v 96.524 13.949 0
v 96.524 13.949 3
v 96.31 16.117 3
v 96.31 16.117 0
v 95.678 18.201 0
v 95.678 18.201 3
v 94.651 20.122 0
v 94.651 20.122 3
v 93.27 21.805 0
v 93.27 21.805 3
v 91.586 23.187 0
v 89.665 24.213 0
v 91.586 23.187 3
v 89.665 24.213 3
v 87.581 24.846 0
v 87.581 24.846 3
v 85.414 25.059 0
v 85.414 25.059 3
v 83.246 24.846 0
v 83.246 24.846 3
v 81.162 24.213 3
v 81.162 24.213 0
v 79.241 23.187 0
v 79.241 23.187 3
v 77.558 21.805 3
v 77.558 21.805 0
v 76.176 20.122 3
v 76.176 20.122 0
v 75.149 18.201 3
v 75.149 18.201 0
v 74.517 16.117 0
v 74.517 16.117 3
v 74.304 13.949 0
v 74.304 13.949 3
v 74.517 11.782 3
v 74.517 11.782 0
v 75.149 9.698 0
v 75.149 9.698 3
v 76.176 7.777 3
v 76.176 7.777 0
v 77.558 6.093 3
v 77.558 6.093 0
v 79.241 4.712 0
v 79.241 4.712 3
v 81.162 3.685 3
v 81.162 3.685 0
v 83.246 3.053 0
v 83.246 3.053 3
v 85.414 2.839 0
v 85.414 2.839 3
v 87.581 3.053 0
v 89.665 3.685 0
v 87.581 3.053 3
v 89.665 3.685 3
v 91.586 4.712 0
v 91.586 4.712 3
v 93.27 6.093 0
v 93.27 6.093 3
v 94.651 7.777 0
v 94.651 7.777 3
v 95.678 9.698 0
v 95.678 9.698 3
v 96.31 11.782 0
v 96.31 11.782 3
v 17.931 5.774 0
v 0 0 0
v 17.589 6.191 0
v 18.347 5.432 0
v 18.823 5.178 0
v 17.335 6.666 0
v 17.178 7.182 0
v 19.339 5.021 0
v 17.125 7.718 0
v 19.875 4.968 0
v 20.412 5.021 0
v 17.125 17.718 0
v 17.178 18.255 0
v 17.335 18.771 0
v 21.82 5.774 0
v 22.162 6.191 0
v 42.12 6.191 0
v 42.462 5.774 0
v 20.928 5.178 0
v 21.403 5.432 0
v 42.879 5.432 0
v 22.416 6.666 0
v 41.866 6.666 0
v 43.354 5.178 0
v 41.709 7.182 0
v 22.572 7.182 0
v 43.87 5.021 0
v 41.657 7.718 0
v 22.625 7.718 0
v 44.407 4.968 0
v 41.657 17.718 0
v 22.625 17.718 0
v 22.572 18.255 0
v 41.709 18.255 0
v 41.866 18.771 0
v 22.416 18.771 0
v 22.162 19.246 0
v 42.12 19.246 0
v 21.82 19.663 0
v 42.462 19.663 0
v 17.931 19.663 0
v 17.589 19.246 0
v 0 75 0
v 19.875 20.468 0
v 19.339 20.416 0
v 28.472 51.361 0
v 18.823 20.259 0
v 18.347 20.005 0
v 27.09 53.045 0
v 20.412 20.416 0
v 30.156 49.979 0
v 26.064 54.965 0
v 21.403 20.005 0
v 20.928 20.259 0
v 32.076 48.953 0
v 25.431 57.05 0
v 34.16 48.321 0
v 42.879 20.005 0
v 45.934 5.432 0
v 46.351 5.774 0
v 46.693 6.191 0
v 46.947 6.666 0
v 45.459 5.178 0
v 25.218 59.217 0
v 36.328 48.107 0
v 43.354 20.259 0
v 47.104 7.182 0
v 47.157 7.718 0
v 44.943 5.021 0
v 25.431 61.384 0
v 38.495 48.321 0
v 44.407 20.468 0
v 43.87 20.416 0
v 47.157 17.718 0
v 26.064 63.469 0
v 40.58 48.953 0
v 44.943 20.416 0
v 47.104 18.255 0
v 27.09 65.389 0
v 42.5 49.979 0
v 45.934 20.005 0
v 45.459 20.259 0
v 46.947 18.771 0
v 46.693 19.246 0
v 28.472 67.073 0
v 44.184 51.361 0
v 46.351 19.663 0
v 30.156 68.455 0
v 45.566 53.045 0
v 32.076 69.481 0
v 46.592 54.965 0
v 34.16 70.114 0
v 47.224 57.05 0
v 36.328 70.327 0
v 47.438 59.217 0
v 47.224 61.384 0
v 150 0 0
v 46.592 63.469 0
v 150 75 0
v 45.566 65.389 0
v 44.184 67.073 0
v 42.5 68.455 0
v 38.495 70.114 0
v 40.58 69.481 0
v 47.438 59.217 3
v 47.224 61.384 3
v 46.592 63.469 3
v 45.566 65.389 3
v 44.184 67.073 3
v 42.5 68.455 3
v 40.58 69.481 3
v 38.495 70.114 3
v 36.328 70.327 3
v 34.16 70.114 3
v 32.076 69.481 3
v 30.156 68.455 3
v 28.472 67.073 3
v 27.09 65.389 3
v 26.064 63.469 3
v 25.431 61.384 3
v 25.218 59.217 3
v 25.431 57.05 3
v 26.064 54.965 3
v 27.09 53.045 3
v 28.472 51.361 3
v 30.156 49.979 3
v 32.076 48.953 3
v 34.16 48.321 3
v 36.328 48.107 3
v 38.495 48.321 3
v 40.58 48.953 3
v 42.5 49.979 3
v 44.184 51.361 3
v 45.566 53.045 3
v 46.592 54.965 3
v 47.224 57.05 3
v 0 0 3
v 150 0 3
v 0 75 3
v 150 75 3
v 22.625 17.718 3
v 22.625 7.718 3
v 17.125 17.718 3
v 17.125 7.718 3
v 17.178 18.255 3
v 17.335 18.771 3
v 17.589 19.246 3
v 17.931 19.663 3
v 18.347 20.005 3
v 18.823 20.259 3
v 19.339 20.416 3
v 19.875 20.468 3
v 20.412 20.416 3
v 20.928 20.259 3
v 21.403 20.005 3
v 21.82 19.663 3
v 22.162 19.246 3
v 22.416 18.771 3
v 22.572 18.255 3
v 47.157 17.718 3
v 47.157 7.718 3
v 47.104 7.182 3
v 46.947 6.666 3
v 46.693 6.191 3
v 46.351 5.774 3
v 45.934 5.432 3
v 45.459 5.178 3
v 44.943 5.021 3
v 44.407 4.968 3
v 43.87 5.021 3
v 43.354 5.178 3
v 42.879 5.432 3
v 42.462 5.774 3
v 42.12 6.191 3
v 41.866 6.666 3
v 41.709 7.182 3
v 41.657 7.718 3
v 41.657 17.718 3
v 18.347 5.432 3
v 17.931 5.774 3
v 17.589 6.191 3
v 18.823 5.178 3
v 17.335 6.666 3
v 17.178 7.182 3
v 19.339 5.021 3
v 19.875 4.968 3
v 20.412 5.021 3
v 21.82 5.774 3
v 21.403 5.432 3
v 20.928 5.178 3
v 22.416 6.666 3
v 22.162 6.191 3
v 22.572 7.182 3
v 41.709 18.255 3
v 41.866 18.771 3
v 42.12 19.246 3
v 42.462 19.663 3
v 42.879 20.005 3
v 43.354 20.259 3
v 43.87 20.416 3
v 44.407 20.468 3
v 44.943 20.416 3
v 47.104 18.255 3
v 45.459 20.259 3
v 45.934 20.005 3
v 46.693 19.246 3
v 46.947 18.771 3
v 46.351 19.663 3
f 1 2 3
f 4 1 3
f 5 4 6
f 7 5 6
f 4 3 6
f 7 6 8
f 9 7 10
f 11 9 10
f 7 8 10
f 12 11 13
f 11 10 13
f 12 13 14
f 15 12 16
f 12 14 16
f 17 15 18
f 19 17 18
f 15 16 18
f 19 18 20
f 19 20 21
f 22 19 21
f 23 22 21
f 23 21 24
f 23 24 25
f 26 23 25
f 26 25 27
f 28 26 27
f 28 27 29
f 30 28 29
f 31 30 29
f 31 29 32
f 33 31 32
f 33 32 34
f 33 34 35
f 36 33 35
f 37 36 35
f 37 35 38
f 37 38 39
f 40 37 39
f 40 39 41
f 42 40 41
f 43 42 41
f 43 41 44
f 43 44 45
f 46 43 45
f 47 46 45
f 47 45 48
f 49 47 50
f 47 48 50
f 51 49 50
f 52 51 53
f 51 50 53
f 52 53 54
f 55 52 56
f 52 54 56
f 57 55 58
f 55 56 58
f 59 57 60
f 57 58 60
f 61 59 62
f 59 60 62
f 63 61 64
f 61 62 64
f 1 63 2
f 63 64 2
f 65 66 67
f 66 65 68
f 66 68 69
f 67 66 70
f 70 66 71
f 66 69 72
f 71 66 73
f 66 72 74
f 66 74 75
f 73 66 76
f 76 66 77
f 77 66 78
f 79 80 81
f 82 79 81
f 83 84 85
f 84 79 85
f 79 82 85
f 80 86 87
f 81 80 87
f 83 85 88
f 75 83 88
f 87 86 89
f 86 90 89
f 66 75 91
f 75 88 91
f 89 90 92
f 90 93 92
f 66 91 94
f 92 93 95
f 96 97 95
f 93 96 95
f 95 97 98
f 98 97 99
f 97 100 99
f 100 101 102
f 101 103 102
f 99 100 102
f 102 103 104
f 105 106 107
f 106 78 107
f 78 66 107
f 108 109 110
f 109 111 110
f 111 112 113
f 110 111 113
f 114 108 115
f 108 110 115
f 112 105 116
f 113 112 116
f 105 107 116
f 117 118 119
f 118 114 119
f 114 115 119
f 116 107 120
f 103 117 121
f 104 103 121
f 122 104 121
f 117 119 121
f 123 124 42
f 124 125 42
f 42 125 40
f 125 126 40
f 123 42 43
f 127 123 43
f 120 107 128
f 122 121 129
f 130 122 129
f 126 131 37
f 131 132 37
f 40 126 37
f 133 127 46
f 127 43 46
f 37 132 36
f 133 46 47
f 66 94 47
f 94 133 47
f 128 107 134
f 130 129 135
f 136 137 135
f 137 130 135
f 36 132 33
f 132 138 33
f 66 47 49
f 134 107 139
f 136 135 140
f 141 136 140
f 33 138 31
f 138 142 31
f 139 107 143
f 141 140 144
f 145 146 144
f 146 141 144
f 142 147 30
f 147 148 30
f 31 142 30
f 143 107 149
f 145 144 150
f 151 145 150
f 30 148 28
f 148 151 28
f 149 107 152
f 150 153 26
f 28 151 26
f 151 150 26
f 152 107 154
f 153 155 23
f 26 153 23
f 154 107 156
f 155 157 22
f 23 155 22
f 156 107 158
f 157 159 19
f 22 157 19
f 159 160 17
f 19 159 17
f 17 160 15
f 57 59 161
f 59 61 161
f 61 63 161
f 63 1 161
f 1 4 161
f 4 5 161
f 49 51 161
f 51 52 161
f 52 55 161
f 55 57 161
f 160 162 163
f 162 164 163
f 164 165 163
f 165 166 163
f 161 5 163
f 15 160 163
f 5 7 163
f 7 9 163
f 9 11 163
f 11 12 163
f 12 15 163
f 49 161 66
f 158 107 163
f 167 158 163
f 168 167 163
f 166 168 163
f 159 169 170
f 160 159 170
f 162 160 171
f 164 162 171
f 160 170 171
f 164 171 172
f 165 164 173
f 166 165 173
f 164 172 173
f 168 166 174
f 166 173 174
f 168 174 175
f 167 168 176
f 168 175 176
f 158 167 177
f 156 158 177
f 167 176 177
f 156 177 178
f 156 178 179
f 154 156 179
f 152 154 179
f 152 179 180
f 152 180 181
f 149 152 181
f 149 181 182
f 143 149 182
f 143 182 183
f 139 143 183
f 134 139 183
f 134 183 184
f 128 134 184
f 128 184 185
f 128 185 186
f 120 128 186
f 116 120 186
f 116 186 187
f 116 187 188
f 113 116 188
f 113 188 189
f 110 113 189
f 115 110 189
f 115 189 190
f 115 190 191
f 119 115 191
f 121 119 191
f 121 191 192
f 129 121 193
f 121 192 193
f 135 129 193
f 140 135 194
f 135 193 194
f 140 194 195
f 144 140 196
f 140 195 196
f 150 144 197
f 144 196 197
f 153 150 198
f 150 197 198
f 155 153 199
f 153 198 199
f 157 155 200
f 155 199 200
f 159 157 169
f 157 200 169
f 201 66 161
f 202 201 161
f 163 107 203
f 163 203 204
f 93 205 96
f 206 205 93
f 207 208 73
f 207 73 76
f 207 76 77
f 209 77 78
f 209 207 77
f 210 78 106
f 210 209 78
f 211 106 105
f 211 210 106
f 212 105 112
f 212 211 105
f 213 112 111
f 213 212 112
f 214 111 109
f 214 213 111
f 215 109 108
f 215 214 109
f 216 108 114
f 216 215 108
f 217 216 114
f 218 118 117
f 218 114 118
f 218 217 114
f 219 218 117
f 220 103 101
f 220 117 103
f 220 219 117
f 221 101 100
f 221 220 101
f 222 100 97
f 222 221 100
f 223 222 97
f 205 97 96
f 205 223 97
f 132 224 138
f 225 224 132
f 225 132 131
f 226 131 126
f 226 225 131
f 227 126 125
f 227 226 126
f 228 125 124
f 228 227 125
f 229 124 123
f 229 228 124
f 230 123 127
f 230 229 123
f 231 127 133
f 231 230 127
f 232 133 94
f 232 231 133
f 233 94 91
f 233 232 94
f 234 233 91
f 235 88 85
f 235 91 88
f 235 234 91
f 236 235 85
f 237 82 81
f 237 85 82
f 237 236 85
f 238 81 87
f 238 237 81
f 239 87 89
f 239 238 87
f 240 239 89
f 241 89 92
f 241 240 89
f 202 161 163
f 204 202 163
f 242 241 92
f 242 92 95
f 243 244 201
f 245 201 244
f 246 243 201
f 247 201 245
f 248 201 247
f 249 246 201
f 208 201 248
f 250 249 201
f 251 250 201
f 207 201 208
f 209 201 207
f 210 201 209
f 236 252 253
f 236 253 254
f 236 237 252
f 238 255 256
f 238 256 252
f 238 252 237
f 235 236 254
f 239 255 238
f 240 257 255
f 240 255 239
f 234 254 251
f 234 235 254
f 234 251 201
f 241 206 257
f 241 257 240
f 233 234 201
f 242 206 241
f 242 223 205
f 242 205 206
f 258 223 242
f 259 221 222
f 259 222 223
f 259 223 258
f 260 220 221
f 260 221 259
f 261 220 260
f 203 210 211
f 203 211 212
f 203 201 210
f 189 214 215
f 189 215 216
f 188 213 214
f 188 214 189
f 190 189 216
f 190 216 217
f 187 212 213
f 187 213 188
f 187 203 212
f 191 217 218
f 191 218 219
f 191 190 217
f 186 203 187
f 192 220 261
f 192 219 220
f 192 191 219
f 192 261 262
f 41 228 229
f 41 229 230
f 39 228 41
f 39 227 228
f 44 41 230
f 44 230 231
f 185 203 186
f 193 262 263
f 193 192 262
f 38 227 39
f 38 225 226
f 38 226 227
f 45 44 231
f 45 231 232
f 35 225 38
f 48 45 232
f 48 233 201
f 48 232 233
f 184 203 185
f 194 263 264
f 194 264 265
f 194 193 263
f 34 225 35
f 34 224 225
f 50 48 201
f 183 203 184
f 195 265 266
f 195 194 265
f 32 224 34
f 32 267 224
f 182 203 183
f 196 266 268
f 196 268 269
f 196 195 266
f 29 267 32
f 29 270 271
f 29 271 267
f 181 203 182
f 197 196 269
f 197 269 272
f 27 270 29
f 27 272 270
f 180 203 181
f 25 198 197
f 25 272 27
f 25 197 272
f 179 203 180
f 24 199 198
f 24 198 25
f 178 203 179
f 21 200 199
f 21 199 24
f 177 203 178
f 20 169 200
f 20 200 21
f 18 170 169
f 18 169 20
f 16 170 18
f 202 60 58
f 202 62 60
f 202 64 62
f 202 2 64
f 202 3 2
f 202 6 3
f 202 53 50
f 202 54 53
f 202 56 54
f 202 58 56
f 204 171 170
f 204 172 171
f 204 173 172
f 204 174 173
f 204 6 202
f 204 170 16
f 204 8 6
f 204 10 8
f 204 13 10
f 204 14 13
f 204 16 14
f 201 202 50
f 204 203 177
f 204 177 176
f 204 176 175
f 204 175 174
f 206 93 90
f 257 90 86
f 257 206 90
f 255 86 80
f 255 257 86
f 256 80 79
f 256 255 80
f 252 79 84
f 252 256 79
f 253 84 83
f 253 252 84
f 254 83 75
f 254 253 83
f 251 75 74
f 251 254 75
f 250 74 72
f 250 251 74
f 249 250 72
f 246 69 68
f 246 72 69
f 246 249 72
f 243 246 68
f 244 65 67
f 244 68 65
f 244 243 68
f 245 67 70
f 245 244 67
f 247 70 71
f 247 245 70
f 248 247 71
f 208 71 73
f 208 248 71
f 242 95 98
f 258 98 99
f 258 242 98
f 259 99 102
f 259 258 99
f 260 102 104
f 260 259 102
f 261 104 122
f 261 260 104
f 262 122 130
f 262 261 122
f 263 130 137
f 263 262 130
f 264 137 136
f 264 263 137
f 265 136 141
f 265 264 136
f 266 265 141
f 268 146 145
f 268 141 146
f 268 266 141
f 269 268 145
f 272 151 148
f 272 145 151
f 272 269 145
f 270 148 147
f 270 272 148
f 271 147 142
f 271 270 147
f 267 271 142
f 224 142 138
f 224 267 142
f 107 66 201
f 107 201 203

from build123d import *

# Parameters (mm, degrees)
SKETCH1_W           = 150
SKETCH1_H           = 75
BOSS_EXTRUDE1_DEPTH = 3
SKETCH2_R           = 11.11
CUT_EXTRUDE1_DEPTH  = 10


with BuildPart() as part:
    # Sketch1 → Boss-Extrude1 (new body)
    with BuildSketch(Plane.XY):
        with Locations((75, 37.5)):
            Rectangle(SKETCH1_W, SKETCH1_H)
    extrude(amount=BOSS_EXTRUDE1_DEPTH)

    # Sketch2 → Cut-Extrude1 (cut)
    with BuildSketch(Plane.XY.offset(3)):
        with Locations((36.327910431, 59.217033853)):
            Circle(SKETCH2_R)
        with Locations((85.413576885, 13.949141457)):
            Circle(SKETCH2_R)
        with BuildLine():
            Line((17.12526901, 7.718435361), (17.12526901, 17.718435361))
            ThreePointArc((17.12526901, 17.718435361), (19.87526901, 20.468435361), (22.62526901, 17.718435361))
            Line((22.62526901, 17.718435361), (22.62526901, 7.718435361))
            ThreePointArc((22.62526901, 7.718435361), (19.87526901, 4.968435361), (17.12526901, 7.718435361))
        make_face()
        with BuildLine():
            Line((41.656612513, 7.718435361), (41.656612513, 17.718435361))
            ThreePointArc((41.656612513, 17.718435361), (44.406612513, 20.468435361), (47.156612513, 17.718435361))
            Line((47.156612513, 17.718435361), (47.156612513, 7.718435361))
            ThreePointArc((47.156612513, 7.718435361), (44.406612513, 4.968435361), (41.656612513, 7.718435361))
        make_face()
    extrude(amount=-CUT_EXTRUDE1_DEPTH, mode=Mode.SUBTRACT)


solid = part.part
